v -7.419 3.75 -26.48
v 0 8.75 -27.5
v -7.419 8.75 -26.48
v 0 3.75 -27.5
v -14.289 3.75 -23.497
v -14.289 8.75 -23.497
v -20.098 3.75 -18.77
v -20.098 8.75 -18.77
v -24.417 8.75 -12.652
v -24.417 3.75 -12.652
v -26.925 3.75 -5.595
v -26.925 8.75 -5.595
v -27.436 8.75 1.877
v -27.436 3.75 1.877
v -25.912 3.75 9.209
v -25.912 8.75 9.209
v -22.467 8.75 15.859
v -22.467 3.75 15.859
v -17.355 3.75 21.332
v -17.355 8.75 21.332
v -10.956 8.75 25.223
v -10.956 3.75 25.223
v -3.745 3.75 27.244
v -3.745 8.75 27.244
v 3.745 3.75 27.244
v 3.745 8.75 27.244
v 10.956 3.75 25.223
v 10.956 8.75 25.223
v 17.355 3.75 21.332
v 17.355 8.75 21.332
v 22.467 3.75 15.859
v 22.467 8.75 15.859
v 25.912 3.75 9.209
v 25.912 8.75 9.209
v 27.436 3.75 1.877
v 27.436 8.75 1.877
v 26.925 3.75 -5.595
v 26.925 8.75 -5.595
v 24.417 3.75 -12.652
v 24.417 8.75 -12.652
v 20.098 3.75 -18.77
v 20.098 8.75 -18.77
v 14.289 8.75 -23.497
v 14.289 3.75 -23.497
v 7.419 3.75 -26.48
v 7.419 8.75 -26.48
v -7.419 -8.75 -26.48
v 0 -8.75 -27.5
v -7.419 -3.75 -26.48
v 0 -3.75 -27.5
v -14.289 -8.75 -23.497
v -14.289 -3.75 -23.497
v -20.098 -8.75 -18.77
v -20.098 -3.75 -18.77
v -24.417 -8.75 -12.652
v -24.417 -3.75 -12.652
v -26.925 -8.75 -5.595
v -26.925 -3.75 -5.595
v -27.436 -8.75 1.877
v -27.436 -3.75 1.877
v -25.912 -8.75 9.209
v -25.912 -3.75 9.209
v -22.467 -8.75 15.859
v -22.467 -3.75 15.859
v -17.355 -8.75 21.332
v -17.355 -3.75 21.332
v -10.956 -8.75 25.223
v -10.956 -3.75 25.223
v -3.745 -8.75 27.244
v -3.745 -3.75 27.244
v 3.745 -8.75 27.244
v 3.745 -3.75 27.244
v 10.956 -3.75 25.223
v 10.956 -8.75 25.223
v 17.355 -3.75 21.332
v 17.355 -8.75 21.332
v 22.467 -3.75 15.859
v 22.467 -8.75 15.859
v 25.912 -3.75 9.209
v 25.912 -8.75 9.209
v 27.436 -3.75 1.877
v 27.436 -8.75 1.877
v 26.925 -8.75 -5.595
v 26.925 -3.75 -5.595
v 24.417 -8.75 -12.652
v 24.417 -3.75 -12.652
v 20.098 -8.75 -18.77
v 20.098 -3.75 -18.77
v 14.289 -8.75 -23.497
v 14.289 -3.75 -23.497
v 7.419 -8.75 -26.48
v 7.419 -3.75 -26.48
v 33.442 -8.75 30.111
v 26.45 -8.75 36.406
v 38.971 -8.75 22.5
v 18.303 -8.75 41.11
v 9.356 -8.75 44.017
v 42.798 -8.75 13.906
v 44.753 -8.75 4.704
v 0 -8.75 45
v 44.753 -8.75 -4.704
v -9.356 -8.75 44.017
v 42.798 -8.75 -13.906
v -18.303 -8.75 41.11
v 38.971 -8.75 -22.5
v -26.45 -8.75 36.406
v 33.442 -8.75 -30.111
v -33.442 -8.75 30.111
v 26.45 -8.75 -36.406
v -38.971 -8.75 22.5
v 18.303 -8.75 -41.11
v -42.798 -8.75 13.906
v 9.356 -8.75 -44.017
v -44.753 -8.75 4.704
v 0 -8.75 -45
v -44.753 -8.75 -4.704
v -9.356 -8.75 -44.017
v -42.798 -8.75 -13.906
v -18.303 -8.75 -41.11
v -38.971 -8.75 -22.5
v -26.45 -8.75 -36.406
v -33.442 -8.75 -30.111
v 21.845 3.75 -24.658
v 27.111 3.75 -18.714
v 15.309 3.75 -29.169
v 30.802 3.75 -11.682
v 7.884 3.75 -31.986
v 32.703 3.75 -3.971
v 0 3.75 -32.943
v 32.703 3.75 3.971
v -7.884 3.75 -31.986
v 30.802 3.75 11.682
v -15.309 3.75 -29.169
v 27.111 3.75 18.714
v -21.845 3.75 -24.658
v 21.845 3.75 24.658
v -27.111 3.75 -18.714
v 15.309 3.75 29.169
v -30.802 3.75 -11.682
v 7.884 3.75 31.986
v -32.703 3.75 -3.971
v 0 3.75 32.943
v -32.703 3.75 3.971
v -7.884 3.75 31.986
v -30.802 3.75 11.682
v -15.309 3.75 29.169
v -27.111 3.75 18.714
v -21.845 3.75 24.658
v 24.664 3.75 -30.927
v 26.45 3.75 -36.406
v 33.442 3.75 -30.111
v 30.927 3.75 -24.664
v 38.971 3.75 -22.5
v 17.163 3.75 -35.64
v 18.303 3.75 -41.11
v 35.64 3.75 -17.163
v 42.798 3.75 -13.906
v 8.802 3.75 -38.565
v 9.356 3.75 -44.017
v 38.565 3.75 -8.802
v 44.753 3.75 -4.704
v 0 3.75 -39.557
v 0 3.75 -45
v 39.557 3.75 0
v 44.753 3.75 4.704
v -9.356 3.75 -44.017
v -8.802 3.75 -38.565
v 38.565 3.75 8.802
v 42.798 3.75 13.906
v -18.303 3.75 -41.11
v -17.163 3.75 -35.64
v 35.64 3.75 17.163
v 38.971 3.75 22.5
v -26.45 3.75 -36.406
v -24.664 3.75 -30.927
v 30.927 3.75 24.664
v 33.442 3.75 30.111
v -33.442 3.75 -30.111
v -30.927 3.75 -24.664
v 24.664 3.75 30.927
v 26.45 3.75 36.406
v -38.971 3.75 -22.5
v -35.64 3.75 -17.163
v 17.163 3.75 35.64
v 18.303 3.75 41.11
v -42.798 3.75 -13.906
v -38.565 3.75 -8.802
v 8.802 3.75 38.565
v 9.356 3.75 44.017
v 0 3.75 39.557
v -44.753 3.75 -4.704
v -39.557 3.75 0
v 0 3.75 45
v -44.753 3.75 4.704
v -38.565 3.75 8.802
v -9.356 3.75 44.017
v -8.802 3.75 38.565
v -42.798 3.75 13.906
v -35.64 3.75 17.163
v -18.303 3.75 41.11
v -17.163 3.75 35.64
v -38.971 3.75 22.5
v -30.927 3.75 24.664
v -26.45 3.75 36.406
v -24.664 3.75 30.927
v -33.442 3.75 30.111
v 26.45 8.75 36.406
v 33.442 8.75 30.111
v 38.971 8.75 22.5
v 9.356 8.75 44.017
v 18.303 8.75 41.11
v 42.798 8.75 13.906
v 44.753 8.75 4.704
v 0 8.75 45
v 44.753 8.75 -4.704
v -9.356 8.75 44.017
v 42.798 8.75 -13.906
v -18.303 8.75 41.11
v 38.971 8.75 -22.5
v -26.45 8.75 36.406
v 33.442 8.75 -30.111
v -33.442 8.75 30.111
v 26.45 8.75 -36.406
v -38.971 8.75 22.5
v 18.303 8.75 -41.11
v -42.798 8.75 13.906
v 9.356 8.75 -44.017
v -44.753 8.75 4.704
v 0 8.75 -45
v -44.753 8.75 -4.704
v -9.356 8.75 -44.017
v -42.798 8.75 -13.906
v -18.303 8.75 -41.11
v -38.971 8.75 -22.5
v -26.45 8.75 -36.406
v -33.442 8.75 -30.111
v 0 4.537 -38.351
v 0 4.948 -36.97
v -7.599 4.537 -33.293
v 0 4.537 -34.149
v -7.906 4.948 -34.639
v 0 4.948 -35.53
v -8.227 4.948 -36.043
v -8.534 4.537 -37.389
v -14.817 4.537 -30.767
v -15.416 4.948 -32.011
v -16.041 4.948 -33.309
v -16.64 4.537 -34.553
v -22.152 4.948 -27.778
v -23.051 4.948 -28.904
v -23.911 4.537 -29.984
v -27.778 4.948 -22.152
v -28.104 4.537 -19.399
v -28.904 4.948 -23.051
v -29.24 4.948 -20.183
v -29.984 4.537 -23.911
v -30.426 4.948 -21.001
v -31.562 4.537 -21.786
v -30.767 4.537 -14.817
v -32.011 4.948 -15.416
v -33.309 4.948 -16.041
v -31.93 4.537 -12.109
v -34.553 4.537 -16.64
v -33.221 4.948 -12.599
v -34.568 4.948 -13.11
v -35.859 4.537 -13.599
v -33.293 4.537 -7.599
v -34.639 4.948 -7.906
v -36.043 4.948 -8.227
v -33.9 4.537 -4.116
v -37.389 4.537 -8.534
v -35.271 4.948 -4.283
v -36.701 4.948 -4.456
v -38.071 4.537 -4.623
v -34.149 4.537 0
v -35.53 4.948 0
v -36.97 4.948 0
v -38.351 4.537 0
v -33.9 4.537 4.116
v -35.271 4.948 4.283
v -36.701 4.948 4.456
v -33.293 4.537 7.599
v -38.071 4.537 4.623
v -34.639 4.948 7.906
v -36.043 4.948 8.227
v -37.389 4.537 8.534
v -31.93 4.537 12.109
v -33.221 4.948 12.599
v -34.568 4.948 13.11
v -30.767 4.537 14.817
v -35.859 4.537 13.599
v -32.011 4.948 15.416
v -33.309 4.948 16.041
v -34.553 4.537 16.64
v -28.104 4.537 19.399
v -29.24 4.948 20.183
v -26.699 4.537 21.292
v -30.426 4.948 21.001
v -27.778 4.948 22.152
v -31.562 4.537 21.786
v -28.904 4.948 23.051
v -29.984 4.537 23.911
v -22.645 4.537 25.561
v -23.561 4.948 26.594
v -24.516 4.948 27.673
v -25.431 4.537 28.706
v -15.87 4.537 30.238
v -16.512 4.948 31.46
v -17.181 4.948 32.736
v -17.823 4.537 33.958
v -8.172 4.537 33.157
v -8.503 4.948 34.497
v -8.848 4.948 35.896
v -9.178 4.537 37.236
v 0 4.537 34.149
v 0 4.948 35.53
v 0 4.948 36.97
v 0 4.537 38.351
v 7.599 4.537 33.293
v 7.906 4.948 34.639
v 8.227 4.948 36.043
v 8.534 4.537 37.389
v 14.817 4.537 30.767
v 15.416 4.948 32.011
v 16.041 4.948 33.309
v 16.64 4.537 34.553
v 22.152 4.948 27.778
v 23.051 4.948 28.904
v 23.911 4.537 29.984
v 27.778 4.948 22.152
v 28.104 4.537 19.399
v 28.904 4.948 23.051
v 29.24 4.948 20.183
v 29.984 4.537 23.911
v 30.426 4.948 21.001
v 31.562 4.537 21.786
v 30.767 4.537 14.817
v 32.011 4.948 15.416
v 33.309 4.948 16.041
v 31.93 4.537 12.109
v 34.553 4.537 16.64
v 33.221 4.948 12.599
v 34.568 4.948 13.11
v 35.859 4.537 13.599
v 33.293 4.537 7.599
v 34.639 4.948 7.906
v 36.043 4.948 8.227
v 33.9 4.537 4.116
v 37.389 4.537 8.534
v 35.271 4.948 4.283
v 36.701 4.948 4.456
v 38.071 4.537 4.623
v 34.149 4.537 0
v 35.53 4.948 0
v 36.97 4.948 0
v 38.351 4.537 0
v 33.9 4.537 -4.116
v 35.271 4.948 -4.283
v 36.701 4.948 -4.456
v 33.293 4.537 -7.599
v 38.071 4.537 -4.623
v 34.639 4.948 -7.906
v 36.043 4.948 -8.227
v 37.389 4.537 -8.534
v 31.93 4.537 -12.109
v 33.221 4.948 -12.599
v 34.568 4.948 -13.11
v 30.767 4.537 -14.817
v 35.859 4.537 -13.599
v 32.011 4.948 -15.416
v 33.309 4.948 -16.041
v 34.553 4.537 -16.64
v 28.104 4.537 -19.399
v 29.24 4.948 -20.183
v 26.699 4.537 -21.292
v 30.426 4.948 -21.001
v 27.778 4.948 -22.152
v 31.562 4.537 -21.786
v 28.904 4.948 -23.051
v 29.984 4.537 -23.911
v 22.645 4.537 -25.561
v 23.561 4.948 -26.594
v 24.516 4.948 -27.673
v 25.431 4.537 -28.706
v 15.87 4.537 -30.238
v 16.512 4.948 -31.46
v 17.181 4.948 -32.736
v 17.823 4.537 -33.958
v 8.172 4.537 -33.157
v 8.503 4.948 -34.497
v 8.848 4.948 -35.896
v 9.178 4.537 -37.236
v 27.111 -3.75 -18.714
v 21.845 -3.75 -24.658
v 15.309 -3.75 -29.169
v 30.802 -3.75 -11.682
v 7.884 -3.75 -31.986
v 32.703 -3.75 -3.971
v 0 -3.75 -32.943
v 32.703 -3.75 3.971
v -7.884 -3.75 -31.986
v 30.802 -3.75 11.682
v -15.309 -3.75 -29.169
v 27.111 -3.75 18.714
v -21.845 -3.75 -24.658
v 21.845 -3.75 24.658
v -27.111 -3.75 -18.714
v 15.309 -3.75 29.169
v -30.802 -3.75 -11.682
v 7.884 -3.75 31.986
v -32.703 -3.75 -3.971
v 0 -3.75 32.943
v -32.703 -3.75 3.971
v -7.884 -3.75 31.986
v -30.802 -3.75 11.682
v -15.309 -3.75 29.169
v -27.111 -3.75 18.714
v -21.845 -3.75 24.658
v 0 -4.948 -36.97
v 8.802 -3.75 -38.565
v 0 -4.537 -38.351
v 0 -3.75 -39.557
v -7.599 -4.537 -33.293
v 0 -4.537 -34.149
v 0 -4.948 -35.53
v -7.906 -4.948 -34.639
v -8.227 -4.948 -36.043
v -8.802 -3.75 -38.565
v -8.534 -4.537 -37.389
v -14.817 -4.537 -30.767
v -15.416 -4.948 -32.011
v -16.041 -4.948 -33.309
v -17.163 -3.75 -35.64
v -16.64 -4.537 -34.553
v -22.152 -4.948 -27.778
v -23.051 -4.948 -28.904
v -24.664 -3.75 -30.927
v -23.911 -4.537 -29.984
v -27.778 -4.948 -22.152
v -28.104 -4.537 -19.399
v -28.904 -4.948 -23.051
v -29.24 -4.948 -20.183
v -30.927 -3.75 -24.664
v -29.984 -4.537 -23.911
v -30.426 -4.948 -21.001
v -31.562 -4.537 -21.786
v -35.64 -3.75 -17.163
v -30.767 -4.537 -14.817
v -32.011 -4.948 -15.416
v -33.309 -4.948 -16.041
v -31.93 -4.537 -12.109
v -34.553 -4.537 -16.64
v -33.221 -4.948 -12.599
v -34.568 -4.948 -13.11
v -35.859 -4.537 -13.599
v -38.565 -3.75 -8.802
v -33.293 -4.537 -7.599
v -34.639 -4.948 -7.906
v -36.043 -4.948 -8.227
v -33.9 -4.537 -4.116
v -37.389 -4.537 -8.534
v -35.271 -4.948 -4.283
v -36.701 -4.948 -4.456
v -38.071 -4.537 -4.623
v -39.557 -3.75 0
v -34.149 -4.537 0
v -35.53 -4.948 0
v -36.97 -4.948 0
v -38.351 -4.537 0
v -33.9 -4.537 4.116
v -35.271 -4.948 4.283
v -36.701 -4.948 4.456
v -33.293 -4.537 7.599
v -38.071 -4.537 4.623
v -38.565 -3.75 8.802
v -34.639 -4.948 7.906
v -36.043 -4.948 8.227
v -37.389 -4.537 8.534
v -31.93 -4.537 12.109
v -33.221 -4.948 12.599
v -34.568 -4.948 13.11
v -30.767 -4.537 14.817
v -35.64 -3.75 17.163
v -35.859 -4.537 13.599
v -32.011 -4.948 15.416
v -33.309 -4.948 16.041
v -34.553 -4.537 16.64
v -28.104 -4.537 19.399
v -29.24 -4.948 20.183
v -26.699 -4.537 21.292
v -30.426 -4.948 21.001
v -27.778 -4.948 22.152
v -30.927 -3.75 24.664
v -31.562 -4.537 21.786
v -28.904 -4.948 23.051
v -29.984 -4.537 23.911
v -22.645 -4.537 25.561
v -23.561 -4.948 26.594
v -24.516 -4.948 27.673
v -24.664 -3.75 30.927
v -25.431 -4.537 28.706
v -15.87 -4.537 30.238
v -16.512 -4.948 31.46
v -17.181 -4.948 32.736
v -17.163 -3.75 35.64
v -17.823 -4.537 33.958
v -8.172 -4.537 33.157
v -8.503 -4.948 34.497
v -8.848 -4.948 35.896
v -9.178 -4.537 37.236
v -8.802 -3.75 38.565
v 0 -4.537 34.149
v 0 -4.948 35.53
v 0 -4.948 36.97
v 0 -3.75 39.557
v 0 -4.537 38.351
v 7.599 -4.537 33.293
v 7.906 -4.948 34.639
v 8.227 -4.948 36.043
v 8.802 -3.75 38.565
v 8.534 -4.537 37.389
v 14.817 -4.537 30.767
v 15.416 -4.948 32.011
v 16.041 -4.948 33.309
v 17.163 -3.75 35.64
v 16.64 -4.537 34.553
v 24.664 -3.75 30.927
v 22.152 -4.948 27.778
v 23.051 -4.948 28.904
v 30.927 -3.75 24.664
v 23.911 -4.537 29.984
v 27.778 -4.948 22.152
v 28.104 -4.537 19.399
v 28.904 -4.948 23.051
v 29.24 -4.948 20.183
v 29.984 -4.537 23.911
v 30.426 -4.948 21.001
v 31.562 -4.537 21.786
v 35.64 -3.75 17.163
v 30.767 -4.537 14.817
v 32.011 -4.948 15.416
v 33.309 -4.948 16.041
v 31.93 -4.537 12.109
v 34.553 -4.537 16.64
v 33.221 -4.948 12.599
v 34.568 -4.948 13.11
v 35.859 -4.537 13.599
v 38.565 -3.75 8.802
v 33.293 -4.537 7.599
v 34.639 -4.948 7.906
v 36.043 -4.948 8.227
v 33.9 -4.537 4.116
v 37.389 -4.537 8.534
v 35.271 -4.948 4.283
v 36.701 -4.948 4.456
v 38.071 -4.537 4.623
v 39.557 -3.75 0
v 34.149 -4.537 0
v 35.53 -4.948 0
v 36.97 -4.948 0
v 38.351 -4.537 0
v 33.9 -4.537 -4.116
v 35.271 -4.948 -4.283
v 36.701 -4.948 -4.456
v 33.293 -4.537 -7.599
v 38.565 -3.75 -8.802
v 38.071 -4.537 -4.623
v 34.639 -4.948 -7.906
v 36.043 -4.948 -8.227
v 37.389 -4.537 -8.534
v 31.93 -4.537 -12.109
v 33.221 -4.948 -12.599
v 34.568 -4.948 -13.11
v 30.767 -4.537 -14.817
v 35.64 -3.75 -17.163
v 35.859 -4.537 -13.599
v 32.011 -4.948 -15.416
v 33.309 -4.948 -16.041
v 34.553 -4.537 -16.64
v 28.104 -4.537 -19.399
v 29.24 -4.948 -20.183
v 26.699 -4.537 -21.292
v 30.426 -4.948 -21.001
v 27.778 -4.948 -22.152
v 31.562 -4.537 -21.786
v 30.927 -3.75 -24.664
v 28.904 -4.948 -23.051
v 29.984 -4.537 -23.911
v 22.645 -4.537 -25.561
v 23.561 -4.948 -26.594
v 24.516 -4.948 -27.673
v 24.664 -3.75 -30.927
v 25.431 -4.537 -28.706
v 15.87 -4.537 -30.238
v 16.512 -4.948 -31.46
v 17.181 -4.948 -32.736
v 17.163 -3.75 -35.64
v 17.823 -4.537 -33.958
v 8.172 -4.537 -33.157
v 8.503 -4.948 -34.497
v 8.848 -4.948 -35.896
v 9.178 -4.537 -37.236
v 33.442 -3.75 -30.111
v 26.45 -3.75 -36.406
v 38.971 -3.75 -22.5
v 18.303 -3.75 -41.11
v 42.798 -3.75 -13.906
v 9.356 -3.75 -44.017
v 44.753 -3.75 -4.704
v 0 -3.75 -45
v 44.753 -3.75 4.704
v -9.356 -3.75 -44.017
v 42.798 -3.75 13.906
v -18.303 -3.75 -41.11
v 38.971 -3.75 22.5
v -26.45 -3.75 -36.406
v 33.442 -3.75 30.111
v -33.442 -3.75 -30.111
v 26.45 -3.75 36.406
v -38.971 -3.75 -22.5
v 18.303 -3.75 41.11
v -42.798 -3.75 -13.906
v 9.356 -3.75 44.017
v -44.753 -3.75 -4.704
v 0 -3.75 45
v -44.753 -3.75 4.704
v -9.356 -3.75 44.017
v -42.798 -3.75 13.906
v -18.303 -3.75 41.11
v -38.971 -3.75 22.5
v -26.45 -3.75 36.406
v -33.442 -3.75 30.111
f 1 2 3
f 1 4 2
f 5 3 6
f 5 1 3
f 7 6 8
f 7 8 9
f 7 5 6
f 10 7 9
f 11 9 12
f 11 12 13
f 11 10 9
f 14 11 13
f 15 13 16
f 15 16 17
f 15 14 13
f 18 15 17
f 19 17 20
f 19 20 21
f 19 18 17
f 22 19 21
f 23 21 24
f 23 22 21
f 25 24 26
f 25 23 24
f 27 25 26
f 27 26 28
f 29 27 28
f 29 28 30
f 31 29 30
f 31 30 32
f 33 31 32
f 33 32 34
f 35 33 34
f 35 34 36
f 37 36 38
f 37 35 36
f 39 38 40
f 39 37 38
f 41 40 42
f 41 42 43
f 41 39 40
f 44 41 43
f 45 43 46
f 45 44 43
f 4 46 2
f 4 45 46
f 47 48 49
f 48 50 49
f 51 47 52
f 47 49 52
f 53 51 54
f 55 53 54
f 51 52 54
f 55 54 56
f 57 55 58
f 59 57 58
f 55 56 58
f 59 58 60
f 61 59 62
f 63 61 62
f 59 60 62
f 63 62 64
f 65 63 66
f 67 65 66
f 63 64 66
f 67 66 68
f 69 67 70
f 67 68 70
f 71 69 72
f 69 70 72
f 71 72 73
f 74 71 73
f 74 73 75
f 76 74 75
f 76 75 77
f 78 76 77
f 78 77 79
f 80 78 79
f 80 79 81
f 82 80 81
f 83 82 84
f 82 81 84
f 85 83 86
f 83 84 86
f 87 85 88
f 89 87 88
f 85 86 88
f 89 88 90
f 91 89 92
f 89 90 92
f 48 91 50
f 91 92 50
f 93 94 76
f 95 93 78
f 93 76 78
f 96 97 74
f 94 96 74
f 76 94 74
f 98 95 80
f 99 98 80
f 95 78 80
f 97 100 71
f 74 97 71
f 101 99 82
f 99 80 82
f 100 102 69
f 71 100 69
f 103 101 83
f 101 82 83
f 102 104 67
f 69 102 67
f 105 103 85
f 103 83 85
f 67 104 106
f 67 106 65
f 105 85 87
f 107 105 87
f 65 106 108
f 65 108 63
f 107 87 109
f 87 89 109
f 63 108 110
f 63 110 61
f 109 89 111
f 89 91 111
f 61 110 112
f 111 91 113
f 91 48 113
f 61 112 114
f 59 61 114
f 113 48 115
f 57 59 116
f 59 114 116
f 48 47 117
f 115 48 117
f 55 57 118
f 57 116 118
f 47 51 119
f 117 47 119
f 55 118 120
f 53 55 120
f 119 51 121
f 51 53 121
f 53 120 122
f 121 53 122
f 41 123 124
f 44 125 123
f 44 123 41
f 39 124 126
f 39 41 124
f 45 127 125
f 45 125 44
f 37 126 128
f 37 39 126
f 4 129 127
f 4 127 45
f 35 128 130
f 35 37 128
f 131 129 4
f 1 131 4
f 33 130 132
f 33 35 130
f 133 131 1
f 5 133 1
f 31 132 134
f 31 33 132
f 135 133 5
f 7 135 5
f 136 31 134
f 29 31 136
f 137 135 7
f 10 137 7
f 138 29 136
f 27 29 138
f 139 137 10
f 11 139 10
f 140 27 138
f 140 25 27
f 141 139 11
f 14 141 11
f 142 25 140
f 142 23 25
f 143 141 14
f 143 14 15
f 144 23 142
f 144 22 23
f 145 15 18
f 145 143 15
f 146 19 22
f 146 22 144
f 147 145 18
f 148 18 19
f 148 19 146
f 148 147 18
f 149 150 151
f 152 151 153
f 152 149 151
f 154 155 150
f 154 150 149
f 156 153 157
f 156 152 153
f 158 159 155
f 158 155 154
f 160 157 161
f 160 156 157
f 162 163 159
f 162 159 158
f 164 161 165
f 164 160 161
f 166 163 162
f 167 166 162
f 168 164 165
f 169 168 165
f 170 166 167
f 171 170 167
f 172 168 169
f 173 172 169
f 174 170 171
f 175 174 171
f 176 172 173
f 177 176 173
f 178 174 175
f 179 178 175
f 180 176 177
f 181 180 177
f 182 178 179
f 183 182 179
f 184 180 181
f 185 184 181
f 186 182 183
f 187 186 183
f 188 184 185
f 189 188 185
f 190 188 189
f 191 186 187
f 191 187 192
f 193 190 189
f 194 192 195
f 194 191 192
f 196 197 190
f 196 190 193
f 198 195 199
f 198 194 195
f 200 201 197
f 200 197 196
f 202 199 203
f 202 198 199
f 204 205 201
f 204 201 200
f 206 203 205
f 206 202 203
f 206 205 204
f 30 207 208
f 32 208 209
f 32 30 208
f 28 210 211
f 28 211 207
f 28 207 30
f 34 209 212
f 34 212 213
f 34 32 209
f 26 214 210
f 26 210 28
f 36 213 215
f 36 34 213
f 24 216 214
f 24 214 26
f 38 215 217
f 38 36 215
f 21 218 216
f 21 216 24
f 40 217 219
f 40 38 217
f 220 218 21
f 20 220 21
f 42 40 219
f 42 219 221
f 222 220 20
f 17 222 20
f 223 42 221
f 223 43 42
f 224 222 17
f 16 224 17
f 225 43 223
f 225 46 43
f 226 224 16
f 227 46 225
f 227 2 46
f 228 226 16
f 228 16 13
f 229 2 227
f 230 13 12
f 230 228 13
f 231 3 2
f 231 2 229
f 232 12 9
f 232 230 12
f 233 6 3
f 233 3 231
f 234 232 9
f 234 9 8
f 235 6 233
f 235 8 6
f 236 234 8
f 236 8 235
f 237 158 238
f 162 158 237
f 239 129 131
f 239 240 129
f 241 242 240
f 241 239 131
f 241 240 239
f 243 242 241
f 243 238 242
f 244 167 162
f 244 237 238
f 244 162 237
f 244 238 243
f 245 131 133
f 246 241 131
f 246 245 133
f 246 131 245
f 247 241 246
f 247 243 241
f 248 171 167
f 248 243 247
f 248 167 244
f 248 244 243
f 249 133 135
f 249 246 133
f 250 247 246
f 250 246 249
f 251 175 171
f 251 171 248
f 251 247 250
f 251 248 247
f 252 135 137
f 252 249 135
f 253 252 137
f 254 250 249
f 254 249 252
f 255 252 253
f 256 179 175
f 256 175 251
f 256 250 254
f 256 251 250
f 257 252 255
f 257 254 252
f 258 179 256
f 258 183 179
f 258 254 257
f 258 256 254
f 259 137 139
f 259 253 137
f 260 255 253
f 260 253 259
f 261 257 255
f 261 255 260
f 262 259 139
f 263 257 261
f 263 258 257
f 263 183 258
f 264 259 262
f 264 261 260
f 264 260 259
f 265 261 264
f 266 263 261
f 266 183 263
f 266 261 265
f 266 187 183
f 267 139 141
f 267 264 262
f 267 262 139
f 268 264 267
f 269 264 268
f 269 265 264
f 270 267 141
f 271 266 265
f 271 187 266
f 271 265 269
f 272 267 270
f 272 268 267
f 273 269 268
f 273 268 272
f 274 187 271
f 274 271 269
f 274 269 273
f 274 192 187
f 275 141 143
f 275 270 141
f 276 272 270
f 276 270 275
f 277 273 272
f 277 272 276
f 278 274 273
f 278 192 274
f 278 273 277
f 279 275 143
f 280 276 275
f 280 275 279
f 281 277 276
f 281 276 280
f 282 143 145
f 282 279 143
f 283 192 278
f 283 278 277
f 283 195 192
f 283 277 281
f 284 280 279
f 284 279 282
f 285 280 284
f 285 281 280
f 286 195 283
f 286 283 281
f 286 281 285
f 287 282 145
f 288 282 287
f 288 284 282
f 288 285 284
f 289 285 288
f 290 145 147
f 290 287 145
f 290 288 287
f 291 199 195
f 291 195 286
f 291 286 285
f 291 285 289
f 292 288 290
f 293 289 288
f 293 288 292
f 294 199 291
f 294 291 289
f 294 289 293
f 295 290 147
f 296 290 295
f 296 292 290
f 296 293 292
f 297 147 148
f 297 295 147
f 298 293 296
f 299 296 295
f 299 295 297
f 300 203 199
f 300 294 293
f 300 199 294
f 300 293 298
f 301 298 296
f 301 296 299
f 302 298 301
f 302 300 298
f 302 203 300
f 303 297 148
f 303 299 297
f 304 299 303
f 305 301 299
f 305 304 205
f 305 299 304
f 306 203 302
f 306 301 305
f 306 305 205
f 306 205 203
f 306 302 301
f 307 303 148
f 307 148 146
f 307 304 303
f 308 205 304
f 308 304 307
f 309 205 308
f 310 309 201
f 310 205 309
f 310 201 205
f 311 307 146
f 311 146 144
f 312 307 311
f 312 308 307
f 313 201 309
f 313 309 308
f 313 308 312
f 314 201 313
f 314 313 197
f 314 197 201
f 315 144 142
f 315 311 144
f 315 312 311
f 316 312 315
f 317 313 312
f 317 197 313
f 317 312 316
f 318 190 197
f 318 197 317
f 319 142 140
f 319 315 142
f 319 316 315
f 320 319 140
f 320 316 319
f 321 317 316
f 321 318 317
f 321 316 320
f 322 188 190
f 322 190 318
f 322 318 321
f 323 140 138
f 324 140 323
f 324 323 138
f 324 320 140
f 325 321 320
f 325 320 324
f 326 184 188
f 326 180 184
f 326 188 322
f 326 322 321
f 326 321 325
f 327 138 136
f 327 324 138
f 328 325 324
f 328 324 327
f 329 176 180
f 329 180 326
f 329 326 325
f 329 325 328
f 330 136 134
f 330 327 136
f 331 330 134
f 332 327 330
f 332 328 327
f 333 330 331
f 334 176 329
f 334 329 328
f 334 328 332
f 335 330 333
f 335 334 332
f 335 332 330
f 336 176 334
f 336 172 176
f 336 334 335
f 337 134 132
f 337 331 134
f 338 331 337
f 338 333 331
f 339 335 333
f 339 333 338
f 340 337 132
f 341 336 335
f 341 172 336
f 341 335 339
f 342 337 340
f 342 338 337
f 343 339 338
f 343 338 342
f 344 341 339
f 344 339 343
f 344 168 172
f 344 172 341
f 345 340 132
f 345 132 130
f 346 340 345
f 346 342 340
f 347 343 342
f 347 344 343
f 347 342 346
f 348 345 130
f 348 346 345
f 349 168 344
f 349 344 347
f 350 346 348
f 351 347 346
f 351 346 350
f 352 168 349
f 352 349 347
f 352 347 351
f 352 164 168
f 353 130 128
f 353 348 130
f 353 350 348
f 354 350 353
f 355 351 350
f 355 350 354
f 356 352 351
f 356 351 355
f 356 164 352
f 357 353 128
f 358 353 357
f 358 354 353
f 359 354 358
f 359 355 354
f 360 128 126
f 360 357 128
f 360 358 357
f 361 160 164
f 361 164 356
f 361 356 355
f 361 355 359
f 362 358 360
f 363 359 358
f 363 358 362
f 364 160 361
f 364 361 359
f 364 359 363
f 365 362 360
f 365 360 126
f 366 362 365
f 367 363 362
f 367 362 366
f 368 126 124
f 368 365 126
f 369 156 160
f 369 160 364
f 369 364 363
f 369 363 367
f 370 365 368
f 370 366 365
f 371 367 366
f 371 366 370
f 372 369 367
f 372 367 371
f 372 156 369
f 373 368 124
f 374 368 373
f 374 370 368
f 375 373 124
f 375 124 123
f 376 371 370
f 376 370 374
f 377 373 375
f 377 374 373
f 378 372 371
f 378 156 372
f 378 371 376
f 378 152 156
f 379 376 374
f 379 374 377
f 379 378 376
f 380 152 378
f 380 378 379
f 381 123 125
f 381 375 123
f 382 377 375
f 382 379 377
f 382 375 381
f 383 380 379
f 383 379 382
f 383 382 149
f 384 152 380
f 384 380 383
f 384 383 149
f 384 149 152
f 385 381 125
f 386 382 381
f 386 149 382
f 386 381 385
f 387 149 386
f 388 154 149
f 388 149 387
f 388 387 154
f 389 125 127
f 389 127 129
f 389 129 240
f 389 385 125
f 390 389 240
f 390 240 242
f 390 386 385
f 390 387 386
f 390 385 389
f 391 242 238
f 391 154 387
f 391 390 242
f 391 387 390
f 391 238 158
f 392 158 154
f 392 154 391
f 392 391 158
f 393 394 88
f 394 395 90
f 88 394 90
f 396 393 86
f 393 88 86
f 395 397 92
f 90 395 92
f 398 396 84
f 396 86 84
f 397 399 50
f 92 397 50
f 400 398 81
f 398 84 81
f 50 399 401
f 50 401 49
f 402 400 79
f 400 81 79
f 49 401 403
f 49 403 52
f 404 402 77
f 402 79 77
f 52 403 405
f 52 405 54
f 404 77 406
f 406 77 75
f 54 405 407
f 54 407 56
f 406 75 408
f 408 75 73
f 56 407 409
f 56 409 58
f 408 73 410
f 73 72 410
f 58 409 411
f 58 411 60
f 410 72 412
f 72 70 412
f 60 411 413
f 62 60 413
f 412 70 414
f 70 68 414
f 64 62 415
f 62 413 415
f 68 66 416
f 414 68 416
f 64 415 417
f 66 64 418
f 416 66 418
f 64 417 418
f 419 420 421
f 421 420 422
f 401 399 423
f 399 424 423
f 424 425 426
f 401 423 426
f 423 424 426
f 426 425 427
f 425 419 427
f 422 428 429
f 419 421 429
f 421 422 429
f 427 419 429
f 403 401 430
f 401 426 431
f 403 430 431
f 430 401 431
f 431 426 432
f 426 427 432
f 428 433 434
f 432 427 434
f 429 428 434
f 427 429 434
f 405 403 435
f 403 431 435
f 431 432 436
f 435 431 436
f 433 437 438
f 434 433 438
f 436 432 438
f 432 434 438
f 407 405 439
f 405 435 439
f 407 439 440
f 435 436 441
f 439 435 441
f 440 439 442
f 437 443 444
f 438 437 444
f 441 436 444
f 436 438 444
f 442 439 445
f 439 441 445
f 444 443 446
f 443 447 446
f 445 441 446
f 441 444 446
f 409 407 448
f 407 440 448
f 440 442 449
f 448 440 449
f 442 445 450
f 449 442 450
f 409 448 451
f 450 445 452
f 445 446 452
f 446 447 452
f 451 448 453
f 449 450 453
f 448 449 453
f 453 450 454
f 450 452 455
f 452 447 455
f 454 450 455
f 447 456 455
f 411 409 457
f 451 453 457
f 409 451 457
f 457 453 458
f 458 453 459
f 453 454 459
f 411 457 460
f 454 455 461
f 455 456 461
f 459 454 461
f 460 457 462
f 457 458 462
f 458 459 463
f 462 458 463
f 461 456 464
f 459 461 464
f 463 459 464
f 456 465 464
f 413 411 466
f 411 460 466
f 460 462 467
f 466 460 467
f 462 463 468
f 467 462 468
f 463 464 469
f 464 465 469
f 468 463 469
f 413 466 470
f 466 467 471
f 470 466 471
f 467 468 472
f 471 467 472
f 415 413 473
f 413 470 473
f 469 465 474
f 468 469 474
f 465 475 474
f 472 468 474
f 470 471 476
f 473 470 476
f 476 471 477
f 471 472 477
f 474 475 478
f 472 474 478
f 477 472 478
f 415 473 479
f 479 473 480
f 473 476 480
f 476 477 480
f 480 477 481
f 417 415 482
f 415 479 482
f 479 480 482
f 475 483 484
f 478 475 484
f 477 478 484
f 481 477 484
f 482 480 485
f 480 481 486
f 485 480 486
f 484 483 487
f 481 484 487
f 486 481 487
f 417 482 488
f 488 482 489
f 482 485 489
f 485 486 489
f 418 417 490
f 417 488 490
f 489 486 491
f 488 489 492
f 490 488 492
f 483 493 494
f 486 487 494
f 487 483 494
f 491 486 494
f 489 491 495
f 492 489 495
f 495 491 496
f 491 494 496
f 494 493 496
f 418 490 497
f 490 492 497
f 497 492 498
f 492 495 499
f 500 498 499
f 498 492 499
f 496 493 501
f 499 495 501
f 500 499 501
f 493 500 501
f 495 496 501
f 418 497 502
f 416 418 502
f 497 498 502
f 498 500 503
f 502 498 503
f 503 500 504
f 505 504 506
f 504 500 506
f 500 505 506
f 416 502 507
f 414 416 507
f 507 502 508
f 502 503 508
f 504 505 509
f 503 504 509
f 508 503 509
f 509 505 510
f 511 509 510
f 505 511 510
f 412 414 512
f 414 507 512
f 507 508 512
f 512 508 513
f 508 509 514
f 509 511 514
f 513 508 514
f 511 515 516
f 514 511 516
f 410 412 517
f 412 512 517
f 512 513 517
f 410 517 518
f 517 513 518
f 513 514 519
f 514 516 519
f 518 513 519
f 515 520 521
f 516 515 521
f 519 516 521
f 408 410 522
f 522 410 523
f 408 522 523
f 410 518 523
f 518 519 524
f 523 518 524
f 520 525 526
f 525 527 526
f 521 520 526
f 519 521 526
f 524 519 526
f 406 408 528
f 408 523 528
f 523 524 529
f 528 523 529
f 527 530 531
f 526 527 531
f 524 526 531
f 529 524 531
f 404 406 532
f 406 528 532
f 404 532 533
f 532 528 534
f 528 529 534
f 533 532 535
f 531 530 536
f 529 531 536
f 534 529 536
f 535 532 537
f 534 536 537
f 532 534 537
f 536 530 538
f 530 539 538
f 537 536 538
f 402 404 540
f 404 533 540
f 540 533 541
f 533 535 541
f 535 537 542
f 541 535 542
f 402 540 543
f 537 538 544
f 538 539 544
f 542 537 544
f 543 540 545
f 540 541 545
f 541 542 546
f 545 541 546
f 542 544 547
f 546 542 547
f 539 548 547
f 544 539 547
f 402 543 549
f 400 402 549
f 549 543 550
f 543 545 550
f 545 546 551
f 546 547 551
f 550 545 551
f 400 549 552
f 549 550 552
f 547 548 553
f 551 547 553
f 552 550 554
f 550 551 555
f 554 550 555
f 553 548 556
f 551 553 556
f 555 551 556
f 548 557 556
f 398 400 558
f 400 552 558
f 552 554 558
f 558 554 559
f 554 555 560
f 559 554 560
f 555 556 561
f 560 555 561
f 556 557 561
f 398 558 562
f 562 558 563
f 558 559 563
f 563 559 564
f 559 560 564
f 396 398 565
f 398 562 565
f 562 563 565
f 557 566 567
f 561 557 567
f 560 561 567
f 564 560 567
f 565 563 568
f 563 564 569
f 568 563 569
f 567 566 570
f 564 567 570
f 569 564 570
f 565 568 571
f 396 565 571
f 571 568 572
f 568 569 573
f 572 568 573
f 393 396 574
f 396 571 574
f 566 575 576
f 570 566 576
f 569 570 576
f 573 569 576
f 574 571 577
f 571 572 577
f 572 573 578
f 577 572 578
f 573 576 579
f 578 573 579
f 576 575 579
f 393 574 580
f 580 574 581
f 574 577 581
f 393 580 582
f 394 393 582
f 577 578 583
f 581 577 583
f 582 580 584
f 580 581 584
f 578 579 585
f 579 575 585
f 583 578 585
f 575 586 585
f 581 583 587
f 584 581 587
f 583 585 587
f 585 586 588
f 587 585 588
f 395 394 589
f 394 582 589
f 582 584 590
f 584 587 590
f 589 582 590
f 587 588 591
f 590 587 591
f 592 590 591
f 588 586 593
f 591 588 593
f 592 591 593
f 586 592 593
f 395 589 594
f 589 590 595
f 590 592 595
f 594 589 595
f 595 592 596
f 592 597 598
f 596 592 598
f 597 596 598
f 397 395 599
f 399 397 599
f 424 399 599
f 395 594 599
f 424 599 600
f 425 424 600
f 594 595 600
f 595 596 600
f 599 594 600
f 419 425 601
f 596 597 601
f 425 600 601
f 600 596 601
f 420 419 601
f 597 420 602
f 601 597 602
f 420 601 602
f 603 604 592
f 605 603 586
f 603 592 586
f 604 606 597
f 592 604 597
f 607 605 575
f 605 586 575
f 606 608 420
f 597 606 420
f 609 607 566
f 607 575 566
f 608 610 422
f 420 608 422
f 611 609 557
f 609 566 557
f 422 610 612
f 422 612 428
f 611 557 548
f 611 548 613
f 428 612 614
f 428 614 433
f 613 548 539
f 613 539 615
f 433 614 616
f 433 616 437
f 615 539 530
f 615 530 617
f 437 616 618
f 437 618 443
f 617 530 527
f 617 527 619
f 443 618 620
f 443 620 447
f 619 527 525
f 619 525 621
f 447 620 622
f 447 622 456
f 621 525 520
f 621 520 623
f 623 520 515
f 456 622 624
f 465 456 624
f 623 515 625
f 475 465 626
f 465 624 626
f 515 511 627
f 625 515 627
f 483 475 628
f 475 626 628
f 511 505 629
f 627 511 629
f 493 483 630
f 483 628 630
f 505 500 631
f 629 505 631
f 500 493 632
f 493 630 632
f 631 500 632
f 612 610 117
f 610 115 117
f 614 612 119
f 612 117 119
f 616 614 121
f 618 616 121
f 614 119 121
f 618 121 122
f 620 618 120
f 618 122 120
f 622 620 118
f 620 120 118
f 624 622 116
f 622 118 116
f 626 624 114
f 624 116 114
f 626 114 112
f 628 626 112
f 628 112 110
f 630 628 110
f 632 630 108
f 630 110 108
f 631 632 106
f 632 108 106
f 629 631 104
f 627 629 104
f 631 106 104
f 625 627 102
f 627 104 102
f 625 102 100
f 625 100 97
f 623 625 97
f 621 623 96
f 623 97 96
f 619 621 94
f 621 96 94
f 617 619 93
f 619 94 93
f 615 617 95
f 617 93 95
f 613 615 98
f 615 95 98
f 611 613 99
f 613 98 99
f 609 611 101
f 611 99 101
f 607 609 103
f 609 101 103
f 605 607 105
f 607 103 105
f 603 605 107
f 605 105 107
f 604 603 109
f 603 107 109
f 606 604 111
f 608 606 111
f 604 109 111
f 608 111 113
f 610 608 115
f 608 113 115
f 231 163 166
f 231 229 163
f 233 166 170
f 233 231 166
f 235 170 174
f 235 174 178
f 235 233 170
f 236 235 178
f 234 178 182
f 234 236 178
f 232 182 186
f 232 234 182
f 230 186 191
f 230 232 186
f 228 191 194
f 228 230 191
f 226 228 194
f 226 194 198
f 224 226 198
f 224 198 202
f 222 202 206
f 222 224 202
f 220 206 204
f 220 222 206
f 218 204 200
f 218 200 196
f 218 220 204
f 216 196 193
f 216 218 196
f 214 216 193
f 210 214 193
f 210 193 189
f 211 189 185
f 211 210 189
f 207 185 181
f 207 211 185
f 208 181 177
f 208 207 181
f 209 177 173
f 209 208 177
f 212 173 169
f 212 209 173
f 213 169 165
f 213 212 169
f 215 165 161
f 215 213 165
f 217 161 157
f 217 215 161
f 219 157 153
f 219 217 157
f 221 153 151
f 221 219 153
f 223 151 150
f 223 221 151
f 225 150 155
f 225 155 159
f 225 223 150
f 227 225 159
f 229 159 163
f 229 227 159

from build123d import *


with BuildPart() as part:
    # Sketch1 → Revolve1 (revolve)
    with BuildSketch(Plane.YZ):
        with BuildLine():
            Line((-8.75, -27.5), (-3.75, -27.5))
            Line((-3.75, -27.5), (-3.75, -32.942810861))
            ThreePointArc((-3.75, -32.942810861), (-5, -36.25), (-3.75, -39.557189139))
            Line((-3.75, -39.557189139), (-3.75, -45))
            Line((-3.75, -45), (-8.75, -45))
            Line((-8.75, -45), (-8.75, -27.5))
        make_face()
        with BuildLine():
            Line((3.75, -39.557189139), (3.75, -45))
            Line((3.75, -45), (8.75, -45))
            Line((8.75, -45), (8.75, -27.5))
            Line((8.75, -27.5), (3.75, -27.5))
            Line((3.75, -27.5), (3.75, -32.942810861))
            ThreePointArc((3.75, -32.942810861), (5, -36.25), (3.75, -39.557189139))
        make_face()
    revolve(axis=Axis((0, -72.777596874, 0), (0, 1, 0)))


solid = part.part
